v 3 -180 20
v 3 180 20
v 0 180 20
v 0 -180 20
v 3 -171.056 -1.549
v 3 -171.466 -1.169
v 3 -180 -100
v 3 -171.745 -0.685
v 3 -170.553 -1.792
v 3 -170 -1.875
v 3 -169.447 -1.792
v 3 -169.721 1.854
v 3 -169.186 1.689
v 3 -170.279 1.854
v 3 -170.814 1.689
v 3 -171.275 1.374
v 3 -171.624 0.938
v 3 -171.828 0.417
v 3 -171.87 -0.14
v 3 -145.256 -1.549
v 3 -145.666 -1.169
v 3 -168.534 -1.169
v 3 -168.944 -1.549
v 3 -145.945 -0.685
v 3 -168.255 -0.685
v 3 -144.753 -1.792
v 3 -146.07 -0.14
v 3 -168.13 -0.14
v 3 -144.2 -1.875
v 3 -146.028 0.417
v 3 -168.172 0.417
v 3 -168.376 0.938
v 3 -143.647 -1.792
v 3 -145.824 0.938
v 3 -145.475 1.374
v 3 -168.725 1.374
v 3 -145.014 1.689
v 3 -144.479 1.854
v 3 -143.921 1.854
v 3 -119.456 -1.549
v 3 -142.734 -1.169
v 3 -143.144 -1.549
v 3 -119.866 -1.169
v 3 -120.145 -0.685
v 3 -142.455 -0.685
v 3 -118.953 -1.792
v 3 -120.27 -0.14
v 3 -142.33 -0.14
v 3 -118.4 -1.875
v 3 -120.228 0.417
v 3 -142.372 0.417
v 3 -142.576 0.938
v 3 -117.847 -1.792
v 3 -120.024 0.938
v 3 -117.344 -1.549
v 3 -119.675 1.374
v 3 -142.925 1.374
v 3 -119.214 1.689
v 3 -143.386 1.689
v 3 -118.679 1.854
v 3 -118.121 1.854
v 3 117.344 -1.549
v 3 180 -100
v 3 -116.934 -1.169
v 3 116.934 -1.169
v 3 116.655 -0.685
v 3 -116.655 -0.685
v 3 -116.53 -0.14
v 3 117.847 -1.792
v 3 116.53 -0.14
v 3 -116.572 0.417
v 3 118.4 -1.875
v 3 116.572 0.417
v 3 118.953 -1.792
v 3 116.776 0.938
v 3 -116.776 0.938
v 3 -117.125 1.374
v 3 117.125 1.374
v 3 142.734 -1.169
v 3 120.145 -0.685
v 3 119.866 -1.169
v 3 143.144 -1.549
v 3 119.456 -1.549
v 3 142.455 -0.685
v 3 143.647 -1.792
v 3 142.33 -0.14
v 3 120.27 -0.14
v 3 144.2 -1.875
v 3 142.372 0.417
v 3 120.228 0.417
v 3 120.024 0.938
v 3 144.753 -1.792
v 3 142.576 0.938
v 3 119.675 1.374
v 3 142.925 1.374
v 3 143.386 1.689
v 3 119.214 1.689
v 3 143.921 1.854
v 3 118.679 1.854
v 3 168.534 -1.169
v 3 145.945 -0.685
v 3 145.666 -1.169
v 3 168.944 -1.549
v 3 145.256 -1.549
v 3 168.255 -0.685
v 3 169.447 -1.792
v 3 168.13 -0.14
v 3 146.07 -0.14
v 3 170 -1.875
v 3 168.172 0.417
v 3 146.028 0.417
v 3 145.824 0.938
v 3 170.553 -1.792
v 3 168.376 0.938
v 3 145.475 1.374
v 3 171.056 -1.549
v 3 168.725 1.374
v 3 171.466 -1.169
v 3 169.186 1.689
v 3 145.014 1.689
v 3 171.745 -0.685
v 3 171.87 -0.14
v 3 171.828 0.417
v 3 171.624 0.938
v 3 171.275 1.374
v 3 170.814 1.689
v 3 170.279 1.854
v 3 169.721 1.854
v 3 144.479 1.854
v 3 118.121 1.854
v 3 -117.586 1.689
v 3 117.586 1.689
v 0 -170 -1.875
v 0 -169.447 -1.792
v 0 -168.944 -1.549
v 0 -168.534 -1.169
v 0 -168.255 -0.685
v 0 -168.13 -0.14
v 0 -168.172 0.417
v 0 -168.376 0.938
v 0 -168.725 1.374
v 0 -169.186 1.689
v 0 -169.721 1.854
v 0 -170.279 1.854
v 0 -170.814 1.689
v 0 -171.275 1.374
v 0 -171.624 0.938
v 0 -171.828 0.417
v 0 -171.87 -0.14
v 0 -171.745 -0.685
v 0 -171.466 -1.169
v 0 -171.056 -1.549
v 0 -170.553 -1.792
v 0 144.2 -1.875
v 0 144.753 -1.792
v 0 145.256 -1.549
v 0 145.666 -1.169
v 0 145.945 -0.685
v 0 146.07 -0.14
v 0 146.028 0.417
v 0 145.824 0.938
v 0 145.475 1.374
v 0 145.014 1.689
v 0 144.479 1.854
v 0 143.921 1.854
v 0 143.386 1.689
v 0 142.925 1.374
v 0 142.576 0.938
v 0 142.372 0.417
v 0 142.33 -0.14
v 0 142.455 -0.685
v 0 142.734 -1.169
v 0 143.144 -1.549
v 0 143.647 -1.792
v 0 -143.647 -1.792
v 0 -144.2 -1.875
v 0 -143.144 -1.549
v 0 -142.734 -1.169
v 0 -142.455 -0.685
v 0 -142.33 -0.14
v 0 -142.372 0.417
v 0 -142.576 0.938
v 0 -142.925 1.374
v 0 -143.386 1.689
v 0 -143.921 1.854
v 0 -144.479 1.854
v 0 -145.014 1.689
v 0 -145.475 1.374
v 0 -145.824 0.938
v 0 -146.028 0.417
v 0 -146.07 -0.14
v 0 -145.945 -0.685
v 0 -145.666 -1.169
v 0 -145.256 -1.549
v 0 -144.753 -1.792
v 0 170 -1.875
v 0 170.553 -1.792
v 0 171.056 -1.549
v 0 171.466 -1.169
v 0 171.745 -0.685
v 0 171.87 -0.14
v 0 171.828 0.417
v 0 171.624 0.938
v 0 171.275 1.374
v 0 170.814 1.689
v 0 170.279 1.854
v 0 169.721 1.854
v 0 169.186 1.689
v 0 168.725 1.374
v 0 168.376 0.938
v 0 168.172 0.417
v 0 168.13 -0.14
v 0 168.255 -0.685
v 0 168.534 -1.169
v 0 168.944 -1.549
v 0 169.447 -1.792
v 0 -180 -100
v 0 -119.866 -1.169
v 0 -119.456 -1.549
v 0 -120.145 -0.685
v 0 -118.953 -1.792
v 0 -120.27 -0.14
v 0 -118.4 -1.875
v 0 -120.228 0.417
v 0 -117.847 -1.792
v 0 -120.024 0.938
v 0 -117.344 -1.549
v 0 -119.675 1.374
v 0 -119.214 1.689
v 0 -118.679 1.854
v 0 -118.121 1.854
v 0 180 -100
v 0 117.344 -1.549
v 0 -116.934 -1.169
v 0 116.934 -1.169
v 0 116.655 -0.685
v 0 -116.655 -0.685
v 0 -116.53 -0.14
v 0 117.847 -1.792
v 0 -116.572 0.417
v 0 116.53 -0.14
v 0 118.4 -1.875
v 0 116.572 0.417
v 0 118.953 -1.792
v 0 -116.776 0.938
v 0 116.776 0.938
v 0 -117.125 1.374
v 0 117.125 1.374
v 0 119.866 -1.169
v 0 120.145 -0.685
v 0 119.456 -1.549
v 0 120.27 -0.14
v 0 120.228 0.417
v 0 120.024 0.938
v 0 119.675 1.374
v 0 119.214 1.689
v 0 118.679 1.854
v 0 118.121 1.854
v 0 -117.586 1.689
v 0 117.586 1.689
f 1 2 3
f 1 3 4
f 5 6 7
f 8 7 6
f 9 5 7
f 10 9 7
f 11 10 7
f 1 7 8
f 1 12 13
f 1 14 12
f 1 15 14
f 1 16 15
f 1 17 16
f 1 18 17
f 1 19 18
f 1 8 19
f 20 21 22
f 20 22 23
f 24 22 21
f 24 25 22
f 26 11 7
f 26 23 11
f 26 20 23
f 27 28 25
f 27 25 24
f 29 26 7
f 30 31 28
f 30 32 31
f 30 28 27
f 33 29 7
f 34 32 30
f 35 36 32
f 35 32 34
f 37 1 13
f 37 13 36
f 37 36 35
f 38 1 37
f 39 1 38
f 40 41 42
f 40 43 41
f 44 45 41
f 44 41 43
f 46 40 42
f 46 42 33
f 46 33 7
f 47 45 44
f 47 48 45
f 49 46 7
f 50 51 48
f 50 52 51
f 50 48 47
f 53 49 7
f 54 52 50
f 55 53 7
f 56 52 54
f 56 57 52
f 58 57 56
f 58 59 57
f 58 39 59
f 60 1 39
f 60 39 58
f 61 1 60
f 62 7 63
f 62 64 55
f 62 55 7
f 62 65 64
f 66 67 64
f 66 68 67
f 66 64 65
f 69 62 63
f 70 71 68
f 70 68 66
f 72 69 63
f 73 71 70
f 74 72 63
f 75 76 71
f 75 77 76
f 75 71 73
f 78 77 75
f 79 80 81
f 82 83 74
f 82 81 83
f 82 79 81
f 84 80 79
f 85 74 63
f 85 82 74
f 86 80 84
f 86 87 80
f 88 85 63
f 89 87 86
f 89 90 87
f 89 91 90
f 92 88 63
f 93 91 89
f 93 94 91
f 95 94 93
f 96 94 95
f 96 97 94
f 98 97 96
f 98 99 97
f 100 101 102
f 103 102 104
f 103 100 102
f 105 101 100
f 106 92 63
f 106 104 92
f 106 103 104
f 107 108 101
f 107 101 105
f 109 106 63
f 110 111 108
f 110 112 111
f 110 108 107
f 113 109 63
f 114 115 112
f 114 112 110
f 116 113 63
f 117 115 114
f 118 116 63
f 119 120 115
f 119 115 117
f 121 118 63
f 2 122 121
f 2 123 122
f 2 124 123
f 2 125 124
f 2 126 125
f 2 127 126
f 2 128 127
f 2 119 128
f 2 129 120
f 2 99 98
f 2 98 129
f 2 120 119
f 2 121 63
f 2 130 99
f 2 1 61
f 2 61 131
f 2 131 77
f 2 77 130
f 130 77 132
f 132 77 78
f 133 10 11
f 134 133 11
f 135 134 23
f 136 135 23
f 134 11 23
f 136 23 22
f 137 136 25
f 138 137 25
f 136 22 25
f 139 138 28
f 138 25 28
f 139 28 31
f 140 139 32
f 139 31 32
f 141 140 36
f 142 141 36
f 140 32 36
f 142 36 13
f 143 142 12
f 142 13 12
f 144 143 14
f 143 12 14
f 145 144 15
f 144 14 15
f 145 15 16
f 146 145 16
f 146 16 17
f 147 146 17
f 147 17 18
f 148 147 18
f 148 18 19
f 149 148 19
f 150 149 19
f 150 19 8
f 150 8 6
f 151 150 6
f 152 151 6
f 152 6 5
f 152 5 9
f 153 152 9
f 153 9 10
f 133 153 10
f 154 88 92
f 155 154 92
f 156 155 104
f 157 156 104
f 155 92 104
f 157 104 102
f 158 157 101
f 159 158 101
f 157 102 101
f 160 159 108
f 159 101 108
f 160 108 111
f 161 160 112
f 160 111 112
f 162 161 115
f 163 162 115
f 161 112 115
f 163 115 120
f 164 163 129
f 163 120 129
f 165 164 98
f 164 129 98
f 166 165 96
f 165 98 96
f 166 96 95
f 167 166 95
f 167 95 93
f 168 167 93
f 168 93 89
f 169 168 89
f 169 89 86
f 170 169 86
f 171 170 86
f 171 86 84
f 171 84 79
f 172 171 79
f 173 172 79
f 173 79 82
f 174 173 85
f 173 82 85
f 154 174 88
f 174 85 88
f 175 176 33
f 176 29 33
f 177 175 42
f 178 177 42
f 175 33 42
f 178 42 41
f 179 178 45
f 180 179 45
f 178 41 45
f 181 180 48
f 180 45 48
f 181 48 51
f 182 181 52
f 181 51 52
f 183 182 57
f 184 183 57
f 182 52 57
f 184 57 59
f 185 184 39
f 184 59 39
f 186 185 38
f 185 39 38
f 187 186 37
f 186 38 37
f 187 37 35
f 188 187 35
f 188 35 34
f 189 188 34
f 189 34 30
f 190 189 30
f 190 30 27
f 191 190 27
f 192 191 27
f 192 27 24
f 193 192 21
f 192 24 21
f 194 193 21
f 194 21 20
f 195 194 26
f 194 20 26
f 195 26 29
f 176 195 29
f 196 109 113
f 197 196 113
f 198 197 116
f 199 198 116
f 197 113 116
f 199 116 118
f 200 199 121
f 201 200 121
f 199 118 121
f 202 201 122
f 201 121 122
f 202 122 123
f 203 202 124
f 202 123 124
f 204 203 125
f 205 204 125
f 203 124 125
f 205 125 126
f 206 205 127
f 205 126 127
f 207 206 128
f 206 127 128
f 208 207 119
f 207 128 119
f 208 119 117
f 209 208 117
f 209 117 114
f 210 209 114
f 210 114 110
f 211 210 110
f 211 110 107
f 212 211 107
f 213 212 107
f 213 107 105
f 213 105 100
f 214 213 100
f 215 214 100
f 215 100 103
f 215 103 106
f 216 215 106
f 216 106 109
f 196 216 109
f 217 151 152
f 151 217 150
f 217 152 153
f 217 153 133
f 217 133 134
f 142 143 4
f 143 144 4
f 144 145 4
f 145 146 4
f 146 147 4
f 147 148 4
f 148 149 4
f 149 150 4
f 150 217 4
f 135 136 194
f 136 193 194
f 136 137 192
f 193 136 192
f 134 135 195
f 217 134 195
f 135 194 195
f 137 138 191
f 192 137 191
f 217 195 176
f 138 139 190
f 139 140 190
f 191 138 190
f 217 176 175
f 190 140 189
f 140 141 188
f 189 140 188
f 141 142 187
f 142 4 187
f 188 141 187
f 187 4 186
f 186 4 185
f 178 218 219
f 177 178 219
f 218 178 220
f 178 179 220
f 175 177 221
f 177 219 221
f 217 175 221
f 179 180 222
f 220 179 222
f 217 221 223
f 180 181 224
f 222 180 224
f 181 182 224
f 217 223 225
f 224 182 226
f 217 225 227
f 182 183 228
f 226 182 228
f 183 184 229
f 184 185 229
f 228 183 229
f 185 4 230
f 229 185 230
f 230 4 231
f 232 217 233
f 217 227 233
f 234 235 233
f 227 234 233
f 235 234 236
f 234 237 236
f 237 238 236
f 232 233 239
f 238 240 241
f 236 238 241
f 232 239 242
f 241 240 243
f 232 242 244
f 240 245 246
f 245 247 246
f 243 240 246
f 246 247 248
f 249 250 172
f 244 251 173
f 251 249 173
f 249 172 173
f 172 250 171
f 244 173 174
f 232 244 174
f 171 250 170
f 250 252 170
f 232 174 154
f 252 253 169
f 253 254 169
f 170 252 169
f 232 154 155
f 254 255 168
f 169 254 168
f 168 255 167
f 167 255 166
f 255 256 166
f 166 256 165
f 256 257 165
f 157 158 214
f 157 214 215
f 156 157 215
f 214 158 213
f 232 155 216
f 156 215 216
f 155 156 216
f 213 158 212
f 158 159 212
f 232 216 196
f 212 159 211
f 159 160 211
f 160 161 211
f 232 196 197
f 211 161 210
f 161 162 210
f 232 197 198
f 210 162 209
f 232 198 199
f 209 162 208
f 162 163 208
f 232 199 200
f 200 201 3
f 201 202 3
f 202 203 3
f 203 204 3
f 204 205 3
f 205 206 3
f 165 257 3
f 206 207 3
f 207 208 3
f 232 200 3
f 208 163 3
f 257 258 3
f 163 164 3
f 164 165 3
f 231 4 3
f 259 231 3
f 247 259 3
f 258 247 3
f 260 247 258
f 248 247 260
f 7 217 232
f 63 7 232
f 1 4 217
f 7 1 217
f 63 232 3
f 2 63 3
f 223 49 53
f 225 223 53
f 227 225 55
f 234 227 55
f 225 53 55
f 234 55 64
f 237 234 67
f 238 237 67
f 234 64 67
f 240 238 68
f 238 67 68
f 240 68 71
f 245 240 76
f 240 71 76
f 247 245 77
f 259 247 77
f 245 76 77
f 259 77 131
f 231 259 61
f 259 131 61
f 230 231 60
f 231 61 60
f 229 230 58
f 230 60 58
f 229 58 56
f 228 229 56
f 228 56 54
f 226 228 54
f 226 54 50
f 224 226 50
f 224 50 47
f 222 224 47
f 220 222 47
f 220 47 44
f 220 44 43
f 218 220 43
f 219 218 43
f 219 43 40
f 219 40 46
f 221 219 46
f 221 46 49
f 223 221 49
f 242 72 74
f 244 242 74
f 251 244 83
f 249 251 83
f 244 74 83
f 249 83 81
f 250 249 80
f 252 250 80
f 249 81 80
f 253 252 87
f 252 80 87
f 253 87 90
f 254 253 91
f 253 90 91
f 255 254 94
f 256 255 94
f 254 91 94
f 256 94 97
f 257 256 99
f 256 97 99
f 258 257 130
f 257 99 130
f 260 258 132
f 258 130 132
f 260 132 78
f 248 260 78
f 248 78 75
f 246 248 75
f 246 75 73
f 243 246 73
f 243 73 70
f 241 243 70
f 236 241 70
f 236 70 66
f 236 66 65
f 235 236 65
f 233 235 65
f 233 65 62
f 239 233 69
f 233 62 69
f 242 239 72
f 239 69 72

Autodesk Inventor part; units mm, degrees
ref_plane "YZ Plane" through (0, 0, 0) normal (1, 0, 0) x (0, 1, 0)
ref_plane "XZ Plane" through (0, 0, 0) normal (0, 1, 0) x (-1, 0, 0)
ref_plane "XY Plane" through (0, 0, 0) normal (0, 0, 1) x (1, 0, 0)
sketch "Sketch1" plane through (0, 0, 0) normal (1, 0, 0) x (0, 1, 0)
  line L0 (180, 100) -> (-180, 100)
  line L1 (-180, 100) -> (-180, -100)
  line L2 (-180, -100) -> (180, -100)
  line L3 (180, -100) -> (180, 100)
  line L4 (180, 100) -> (-180, -100) construction
  line L5 (-180, 100) -> (180, -100) construction
  point P0 (0, 0)
  dimension "d0" = 360
  dimension "d1" = 200
extrude "Extrusion1" add sketch "Sketch1" along normal blind 3
sketch "Sketch5" plane through (3, 0, 0) normal (1, 0, 0) x (0, 0, -1)
  circle A0 centre (0, 170) radius 1.875
  circle A1 centre (0, 144.2) radius 1.875
  circle A2 centre (0, 118.4) radius 1.875
  line L0 (100, 180) -> (-100, 180) projected
  line L1 (-100, 180) -> (-100, -180) projected
  line L2 (100, -180) -> (100, 180) projected
  circle A3 centre (0, -170) radius 1.875
  circle A4 centre (0, -144.2) radius 1.875
  circle A5 centre (0, -118.4) radius 1.875
  line L3 (-100, -180) -> (100, -180) projected
  line L4 (-100, -180) -> (100, -180)
  dimension "d46" = 10
  dimension "d47" = 25.8
  dimension "d48" = 25.8
extrude "Extrusion8" cut sketch "Sketch5" against normal blind 3 contours A0 | A1 | A2 | A3 | A4 | A5
sketch "Sketch6" plane through (3, 0, 0) normal (1, 0, 0) x (0, 0, -1)
  line L0 (100, 180) -> (-100, 180) projected
  line L1 (-100, 180) -> (-20, 180)
  line L2 (-20, 180) -> (-20, -170.3754)
  line L3 (-20, 180) -> (330.3754, 180) construction
  line L4 (-20, -170.3754) -> (-20, -180)
  line L5 (-100, -180) -> (100, -180) projected
  line L6 (-20, -180) -> (-100, -180)
  line L7 (-100, 180) -> (-100, -180) projected
  line L8 (-100, 180) -> (-100, -180)
  point P0 (0, 0)
  dimension "d65" = 80
  dimension "d66" = 90
extrude "Extrusion9" cut sketch "Sketch6" against normal blind 3
properties part number "leftside"
